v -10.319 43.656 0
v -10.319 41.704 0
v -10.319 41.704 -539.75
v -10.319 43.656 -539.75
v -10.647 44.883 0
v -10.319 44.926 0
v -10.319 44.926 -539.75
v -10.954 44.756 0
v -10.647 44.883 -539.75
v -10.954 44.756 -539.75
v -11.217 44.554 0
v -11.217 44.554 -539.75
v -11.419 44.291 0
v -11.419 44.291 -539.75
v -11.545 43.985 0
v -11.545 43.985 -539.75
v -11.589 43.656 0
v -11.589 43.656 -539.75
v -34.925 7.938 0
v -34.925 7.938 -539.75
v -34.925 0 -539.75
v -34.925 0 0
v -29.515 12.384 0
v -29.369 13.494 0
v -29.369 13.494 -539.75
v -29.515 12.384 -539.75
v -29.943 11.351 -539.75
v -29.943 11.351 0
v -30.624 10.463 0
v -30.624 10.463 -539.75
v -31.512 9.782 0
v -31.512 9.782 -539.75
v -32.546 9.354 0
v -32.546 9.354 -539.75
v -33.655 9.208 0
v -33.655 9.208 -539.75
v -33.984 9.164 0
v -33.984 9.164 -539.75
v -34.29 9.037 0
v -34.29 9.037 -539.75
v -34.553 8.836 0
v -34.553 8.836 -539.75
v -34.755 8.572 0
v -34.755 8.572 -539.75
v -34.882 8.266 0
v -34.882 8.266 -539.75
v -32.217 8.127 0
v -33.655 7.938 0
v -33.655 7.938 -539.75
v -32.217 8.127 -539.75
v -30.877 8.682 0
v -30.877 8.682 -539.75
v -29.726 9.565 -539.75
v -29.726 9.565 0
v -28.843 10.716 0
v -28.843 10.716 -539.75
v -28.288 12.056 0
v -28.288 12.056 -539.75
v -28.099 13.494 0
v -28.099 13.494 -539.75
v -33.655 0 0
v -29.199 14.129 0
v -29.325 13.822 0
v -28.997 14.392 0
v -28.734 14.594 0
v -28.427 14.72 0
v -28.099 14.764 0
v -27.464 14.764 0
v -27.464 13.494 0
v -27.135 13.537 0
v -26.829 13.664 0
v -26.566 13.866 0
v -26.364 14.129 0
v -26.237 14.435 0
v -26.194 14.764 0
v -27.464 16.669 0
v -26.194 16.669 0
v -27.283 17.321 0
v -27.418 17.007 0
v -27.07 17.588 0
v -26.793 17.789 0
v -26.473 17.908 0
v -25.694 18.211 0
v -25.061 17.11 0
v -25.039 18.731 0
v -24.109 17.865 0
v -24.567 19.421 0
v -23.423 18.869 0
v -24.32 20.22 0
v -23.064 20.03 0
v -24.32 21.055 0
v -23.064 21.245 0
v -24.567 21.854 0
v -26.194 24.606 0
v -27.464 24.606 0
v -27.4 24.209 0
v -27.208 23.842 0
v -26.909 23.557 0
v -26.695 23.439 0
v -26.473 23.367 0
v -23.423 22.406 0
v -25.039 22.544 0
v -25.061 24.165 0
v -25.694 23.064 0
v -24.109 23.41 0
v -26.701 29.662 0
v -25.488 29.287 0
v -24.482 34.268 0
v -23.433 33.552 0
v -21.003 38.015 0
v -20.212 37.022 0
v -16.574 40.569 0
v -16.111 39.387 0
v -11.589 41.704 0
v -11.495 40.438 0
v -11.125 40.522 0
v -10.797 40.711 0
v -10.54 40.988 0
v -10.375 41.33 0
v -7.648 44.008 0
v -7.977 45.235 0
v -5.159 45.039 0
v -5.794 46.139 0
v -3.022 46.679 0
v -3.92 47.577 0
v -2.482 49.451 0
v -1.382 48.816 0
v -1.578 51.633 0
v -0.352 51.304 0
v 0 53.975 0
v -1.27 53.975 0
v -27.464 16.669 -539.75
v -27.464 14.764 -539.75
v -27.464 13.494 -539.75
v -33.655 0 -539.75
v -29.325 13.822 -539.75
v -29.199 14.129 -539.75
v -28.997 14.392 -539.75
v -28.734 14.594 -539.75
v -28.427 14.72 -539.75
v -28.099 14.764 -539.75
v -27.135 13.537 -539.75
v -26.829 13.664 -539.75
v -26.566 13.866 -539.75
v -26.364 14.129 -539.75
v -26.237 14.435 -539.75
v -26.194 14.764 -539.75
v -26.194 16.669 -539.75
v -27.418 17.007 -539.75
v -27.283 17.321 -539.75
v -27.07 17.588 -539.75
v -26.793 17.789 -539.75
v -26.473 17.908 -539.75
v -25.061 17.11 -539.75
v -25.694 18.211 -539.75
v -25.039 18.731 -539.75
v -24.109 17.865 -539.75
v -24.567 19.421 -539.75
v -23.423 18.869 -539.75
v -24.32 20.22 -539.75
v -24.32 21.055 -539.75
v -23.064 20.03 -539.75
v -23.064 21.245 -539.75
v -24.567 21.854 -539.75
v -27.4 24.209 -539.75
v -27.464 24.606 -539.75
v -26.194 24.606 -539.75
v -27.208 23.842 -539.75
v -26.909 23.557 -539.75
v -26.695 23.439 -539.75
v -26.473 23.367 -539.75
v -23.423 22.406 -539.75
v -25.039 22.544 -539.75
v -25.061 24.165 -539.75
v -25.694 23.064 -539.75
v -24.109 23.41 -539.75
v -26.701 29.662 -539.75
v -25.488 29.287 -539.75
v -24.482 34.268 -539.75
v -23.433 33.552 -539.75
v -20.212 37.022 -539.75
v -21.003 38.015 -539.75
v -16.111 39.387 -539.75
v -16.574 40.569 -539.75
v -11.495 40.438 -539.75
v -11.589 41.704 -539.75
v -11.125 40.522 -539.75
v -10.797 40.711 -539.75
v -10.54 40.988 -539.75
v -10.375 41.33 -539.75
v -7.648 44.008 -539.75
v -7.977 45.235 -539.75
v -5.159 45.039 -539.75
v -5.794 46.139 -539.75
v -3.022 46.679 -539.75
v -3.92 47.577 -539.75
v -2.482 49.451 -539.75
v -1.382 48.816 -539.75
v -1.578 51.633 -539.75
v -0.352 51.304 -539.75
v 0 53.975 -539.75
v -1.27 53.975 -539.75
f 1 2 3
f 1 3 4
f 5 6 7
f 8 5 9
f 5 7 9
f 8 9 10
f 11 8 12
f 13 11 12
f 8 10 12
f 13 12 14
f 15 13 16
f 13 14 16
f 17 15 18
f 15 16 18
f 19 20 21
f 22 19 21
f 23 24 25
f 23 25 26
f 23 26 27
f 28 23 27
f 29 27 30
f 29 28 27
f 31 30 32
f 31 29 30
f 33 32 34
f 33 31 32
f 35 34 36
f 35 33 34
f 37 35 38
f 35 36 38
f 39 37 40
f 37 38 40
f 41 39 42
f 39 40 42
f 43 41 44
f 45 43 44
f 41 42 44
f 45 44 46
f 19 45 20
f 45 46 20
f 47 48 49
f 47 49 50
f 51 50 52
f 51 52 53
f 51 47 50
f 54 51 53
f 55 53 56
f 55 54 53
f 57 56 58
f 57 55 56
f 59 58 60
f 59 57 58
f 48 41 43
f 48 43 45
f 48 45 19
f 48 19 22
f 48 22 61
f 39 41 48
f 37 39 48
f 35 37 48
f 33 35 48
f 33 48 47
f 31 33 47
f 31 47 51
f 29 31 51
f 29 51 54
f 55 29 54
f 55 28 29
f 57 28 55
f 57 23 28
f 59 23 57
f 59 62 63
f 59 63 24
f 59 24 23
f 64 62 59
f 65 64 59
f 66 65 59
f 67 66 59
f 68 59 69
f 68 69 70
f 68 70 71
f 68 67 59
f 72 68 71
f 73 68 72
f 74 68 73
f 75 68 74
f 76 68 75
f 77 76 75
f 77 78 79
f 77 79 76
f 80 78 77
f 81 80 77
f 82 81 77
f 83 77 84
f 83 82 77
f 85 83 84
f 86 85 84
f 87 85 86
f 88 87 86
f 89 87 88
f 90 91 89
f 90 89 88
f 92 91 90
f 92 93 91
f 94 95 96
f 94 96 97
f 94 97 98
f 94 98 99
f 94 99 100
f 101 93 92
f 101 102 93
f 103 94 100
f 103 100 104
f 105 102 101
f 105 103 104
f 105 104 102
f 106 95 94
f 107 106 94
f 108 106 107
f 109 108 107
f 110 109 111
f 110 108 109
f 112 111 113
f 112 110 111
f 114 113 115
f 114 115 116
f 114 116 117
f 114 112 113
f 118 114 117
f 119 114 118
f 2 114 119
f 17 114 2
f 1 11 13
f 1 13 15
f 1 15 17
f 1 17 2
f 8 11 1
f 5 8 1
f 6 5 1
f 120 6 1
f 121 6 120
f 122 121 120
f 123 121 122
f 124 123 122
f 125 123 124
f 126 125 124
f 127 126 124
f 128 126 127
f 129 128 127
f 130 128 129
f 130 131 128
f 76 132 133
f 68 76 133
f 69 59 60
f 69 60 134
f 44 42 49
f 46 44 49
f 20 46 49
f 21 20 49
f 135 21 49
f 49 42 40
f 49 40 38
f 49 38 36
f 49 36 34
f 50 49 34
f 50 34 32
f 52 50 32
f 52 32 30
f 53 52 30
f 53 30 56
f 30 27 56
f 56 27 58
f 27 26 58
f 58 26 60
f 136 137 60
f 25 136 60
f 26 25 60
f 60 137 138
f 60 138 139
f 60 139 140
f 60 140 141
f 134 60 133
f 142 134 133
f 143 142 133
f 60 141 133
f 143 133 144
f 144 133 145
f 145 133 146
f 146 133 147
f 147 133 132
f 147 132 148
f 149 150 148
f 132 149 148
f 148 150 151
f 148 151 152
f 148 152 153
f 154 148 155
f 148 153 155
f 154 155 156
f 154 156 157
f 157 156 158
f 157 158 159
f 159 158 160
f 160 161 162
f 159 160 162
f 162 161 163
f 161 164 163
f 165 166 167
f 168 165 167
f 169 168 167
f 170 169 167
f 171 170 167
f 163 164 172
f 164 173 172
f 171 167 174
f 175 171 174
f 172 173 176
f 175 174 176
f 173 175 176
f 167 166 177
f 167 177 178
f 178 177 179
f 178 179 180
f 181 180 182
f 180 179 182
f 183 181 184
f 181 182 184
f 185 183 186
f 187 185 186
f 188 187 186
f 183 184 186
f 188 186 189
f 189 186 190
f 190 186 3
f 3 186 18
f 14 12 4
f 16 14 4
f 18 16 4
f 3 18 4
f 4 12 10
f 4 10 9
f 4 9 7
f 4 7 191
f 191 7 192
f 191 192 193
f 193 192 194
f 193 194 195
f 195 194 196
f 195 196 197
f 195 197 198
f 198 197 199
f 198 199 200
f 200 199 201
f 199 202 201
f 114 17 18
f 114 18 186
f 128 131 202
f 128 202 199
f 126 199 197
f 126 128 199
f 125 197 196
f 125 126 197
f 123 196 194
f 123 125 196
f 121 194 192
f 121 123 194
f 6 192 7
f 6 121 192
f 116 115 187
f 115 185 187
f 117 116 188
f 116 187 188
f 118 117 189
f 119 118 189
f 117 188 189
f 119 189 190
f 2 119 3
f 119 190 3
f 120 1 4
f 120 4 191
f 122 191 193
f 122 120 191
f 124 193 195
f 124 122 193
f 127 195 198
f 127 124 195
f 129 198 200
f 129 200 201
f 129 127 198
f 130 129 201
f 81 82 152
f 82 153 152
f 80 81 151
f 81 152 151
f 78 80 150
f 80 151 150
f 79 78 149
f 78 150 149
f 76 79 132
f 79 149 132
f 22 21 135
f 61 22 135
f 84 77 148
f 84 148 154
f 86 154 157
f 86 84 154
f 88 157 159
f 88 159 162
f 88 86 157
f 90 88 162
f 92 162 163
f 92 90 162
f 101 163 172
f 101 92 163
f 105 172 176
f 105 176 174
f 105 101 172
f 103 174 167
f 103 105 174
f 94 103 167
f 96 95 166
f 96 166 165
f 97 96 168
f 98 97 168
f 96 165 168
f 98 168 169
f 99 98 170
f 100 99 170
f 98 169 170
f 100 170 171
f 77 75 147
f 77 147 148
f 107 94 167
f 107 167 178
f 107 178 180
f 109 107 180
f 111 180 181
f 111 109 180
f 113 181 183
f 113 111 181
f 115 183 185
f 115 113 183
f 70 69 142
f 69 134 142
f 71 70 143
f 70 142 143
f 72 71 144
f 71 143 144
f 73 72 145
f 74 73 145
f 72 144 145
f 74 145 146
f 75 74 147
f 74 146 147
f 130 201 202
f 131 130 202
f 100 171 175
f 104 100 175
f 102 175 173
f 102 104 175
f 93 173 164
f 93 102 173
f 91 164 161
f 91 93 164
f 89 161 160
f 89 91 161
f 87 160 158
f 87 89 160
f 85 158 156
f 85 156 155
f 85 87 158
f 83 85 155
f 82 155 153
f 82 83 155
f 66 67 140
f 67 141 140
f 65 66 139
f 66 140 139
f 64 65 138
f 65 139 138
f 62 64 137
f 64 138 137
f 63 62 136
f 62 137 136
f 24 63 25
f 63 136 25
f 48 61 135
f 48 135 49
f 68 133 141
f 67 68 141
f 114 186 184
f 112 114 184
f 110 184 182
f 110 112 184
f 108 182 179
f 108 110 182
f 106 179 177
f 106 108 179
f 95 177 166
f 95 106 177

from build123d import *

# Parameters (mm, degrees)
EXTRUDE_THIN1_DEPTH = 539.75
FILLET1_R           = 1.27


with BuildPart() as part:
    # Sketch1 → Extrude-Thin1 (new body)
    with BuildSketch(Plane.XY):
        with BuildLine():
            Line((-33.655, 0), (-33.655, 7.9375))
            ThreePointArc((-33.655, 7.9375), (-29.726138, 9.564888), (-28.09875, 13.49375))
            Line((-28.09875, 13.49375), (-26.19375, 13.49375))
            Line((-26.19375, 13.49375), (-26.19375, 16.66875))
            ThreePointArc((-26.19375, 16.66875), (-23.01875, 20.6375), (-26.19375, 24.60625))
            ThreePointArc((-26.19375, 24.60625), (-21.54407, 35.83157), (-10.31875, 40.48125))
            Line((-10.31875, 40.48125), (-10.31875, 43.65625))
            ThreePointArc((-10.31875, 43.65625), (-3.022292, 46.678542), (0, 53.975))
            Line((0, 53.975), (-1.27, 53.975))
            ThreePointArc((-1.27, 53.975), (-4.386298, 47.142292), (-11.58875, 45.015816))
            Line((-11.58875, 45.015816), (-11.58875, 41.704148))
            ThreePointArc((-11.58875, 41.704148), (-23.280923, 35.828241), (-27.422334, 23.415267))
            ThreePointArc((-27.422334, 23.415267), (-24.288828, 20.616622), (-27.46375, 17.86505))
            Line((-27.46375, 17.86505), (-27.46375, 14.76375))
            Line((-27.46375, 14.76375), (-29.561219, 14.76375))
            ThreePointArc((-29.561219, 14.76375), (-30.624164, 10.462914), (-34.925, 9.399969))
            Line((-34.925, 9.399969), (-34.925, 0))
            Line((-34.925, 0), (-33.655, 0))
        make_face()
    extrude(amount=-EXTRUDE_THIN1_DEPTH)

    # Fillet1
    fillet1_edges = [part.edges().sort_by_distance(p)[0] for p in [
        (-10.31875, 40.48125, -269.875),
        (-26.19375, 13.49375, -269.875),
        (-34.925, 9.399969, -269.875),
        (-29.561219, 14.76375, -269.875),
        (-27.46375, 17.86505, -269.875),
        (-27.422334, 23.415267, -269.875),
        (-11.58875, 45.015816, -269.875),
    ]]
    fillet(fillet1_edges, radius=FILLET1_R)


solid = part.part
